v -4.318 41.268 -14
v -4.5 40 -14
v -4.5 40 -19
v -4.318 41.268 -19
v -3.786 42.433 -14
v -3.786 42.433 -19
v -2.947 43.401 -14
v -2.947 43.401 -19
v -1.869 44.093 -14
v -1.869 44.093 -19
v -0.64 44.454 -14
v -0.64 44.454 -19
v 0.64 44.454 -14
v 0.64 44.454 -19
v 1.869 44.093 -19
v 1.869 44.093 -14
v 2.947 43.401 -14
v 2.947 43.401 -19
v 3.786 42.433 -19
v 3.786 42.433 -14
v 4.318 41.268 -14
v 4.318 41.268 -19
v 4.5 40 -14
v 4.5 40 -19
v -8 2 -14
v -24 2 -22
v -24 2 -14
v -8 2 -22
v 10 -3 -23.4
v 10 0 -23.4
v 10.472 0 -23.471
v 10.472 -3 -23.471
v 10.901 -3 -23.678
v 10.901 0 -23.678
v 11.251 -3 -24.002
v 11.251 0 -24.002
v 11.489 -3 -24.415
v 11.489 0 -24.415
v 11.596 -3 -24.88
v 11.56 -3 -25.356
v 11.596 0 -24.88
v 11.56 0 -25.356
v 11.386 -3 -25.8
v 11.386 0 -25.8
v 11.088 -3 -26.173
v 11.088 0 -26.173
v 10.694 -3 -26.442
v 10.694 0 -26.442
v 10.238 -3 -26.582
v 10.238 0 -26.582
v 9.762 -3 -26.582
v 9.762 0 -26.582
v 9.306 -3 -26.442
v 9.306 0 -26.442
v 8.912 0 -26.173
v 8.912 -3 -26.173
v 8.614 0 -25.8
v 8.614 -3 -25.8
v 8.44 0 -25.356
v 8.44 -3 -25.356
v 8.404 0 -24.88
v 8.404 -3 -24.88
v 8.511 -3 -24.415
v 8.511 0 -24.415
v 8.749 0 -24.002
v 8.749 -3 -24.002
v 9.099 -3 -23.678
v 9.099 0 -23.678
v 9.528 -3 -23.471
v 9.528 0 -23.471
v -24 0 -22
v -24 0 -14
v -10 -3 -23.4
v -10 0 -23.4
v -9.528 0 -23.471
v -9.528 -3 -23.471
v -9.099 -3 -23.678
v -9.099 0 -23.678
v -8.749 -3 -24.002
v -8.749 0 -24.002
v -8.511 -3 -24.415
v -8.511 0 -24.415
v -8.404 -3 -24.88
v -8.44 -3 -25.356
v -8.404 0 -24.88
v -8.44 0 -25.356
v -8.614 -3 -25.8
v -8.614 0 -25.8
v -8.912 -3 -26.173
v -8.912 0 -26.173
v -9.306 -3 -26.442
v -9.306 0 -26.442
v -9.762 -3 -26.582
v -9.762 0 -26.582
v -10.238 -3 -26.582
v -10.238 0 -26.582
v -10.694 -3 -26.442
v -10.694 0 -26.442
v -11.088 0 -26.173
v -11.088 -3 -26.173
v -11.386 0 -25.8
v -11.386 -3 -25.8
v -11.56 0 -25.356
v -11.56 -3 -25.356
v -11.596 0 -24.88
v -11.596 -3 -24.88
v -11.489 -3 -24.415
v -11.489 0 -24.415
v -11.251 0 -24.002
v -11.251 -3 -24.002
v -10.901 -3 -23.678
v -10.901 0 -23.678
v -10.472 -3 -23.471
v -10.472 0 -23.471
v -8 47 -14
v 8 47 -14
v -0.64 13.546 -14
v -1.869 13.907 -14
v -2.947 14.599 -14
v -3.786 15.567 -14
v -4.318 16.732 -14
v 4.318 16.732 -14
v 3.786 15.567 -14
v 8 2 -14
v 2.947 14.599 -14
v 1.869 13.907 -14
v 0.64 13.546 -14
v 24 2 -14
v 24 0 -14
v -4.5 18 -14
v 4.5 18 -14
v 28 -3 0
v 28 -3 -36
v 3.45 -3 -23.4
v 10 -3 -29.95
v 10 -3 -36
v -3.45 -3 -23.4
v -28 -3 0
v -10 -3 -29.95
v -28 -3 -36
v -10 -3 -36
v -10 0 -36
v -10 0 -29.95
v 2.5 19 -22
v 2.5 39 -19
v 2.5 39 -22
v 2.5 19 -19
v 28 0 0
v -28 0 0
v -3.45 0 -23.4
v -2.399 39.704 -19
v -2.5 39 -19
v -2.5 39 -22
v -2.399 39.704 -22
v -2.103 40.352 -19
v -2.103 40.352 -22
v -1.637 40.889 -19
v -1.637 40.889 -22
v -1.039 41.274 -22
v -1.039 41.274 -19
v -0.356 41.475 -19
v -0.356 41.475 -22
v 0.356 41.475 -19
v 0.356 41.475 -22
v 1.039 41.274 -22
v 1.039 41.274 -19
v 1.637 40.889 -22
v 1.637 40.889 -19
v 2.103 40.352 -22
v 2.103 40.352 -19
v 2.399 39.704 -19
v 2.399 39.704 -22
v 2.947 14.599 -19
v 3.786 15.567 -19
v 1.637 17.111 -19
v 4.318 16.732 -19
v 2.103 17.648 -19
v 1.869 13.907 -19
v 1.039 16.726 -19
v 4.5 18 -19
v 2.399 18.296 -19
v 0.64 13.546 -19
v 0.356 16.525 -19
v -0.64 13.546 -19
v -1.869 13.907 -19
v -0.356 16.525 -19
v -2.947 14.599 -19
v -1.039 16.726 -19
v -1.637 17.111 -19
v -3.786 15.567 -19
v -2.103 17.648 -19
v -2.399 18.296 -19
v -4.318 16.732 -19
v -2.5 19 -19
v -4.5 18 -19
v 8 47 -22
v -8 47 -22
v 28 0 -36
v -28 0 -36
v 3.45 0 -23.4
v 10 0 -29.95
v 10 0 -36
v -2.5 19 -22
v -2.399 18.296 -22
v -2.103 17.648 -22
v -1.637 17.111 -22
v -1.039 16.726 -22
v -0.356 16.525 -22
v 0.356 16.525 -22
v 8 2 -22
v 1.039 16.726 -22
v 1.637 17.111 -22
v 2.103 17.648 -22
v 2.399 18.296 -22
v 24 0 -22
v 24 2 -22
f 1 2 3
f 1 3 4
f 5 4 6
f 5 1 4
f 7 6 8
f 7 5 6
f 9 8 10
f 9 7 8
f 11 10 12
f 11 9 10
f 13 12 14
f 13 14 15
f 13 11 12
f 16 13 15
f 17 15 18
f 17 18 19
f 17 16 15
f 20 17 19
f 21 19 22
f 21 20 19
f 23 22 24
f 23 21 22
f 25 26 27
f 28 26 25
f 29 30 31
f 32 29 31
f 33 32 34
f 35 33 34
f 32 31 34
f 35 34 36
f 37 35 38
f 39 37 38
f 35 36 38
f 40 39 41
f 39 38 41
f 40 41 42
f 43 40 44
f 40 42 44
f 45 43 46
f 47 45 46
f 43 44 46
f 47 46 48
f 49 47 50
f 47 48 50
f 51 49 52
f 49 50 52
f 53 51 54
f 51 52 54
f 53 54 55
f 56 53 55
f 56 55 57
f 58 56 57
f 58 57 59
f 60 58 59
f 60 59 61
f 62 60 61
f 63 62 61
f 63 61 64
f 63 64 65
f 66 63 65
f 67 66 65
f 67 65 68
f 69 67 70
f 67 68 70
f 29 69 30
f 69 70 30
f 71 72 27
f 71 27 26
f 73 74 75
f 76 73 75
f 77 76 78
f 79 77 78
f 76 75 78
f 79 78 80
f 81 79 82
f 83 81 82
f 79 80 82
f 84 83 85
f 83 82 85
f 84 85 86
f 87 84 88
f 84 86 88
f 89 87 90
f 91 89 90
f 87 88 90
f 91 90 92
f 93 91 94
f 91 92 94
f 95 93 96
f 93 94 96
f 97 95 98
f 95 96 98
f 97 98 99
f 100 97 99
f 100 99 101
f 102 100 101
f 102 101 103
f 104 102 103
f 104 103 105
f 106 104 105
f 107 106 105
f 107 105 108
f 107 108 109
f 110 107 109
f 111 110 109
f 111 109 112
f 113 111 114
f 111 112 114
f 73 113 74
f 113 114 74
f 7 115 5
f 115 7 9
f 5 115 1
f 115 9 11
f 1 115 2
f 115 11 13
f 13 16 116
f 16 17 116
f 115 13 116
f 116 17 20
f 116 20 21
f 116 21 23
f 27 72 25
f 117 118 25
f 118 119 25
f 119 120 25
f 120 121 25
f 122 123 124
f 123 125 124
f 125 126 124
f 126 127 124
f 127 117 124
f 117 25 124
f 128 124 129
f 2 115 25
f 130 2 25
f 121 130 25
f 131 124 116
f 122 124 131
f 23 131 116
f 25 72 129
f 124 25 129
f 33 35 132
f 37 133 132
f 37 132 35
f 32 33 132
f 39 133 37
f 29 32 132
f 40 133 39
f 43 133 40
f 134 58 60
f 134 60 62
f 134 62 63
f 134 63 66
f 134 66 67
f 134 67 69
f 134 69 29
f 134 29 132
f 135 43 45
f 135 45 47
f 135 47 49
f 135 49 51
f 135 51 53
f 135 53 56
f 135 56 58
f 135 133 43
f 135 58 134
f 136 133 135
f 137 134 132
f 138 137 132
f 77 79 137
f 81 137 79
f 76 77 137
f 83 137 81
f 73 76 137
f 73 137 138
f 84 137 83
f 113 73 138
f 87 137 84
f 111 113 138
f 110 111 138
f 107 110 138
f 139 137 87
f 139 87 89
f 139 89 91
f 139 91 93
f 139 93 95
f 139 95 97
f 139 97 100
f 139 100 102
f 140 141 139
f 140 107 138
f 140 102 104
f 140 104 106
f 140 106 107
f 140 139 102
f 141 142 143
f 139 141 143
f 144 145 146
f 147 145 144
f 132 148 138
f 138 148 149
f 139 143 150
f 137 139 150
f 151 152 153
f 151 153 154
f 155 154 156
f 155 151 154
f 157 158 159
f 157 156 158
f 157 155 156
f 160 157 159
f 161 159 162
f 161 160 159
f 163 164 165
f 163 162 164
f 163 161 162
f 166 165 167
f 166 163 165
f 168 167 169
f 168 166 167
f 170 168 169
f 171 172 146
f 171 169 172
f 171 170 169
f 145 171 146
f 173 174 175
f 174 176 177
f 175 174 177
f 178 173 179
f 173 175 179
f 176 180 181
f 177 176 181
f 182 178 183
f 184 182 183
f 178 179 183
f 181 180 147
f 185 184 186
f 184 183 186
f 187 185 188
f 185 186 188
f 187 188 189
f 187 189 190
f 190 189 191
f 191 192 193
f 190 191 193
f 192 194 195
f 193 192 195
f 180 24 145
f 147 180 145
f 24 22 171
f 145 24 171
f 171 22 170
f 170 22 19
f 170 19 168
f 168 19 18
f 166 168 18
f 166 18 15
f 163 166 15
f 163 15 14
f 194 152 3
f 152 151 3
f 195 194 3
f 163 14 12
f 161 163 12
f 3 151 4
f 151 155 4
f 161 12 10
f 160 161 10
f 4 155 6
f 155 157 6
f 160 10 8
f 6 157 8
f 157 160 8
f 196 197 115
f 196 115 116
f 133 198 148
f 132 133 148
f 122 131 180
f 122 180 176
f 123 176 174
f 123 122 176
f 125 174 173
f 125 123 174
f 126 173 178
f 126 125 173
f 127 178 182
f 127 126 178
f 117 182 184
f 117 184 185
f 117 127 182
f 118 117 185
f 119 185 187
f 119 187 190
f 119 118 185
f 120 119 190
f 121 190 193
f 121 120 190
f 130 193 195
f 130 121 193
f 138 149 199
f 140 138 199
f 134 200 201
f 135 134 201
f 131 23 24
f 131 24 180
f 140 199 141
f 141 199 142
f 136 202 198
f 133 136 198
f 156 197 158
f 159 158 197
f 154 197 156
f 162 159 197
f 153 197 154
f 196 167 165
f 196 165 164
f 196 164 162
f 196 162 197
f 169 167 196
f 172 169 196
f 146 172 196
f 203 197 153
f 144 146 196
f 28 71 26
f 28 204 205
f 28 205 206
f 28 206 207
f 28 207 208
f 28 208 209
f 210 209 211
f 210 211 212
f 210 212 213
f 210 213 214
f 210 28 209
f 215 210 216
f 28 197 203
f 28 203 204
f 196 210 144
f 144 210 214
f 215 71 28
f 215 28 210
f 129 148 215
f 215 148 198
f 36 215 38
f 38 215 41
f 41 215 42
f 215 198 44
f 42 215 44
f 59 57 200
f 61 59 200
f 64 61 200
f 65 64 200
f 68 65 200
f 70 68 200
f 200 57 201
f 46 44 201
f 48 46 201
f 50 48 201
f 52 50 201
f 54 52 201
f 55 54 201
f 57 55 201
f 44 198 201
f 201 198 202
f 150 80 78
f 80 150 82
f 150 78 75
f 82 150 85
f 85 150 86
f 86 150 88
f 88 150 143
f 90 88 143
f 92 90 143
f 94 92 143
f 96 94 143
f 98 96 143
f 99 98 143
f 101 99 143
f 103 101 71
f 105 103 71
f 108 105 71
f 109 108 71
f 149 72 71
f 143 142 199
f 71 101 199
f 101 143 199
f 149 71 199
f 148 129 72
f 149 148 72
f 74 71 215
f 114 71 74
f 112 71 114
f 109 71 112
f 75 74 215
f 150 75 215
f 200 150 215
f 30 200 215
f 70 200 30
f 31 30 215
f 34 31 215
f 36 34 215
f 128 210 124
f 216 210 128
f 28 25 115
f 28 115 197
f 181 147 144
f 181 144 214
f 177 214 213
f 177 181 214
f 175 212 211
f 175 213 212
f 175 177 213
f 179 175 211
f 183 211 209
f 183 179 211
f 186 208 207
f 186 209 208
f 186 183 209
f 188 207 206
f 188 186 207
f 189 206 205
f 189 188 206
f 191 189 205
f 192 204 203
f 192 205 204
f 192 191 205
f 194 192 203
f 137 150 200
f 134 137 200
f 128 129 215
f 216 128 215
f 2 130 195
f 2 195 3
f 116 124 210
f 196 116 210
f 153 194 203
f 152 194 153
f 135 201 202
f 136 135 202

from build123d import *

# Parameters (mm, degrees)
SKETCH_2_R          = 1.6
EXTRUDE_2_DEPTH     = 3
SKETCH_3_W          = 48
SKETCH_3_H          = 8
EXTRUDE_3_DEPTH     = 2
SKETCH_4_W          = 16
SKETCH_4_H          = 8
EXTRUDE_4_DEPTH     = 45
CUT_EXTRUDE_1_DEPTH = 59.966091951
CUT_EXTRUDE_2_DEPTH = 5


with BuildPart() as part:
    # 草图2 → 凸台-拉伸2 (new body)
    with BuildSketch(Plane(origin=(0, 0, 0), x_dir=(1, 0, 0), z_dir=(0, 1, 0))):
        Polygon((-28, 36), (-10, 36), (-10, 29.949747468), (-3.450252532, 23.4), (3.450252532, 23.4), (10, 29.949747468), (10, 36), (28, 36), (28, 0), (-28, 0), align=None)
        with Locations(Location((-10, 25, 0), (0, 0, 270))):
            Circle(SKETCH_2_R, mode=Mode.SUBTRACT)
        with Locations(Location((10, 25, 0), (0, 0, 270))):
            Circle(SKETCH_2_R, mode=Mode.SUBTRACT)
    extrude(amount=-EXTRUDE_2_DEPTH)

    # 草图3 → 凸台-拉伸3 (add)
    with BuildSketch(Plane(origin=(0, 0, 0), x_dir=(1, 0, 0), z_dir=(0, 1, 0))):
        with Locations((0, 18)):
            Rectangle(SKETCH_3_W, SKETCH_3_H)
    extrude(amount=EXTRUDE_3_DEPTH)

    # 草图4 → 凸台-拉伸4 (add)
    with BuildSketch(Plane(origin=(0, 2, 0), x_dir=(1, 0, 0), z_dir=(0, 1, 0))):
        with Locations((0, 18)):
            Rectangle(SKETCH_4_W, SKETCH_4_H)
    extrude(amount=EXTRUDE_4_DEPTH)

    # 草图5 → 切除-拉伸1 (cut, through all)
    with BuildSketch(Plane.XY.offset(-14)):
        with BuildLine():
            Line((2.5, 39), (2.5, 19))
            ThreePointArc((2.5, 19), (0, 16.5), (-2.5, 19))
            Line((-2.5, 19), (-2.5, 39))
            ThreePointArc((-2.5, 39), (0, 41.5), (2.5, 39))
        make_face()
    extrude(amount=-CUT_EXTRUDE_1_DEPTH, mode=Mode.SUBTRACT)

    # 草图6 → 切除-拉伸2 (cut)
    with BuildSketch(Plane.XY.offset(-14)):
        with BuildLine():
            Line((4.5, 40), (4.5, 18))
            ThreePointArc((4.5, 18), (0, 13.5), (-4.5, 18))
            Line((-4.5, 18), (-4.5, 40))
            ThreePointArc((-4.5, 40), (0, 44.5), (4.5, 40))
        make_face()
    extrude(amount=-CUT_EXTRUDE_2_DEPTH, mode=Mode.SUBTRACT)


solid = part.part
